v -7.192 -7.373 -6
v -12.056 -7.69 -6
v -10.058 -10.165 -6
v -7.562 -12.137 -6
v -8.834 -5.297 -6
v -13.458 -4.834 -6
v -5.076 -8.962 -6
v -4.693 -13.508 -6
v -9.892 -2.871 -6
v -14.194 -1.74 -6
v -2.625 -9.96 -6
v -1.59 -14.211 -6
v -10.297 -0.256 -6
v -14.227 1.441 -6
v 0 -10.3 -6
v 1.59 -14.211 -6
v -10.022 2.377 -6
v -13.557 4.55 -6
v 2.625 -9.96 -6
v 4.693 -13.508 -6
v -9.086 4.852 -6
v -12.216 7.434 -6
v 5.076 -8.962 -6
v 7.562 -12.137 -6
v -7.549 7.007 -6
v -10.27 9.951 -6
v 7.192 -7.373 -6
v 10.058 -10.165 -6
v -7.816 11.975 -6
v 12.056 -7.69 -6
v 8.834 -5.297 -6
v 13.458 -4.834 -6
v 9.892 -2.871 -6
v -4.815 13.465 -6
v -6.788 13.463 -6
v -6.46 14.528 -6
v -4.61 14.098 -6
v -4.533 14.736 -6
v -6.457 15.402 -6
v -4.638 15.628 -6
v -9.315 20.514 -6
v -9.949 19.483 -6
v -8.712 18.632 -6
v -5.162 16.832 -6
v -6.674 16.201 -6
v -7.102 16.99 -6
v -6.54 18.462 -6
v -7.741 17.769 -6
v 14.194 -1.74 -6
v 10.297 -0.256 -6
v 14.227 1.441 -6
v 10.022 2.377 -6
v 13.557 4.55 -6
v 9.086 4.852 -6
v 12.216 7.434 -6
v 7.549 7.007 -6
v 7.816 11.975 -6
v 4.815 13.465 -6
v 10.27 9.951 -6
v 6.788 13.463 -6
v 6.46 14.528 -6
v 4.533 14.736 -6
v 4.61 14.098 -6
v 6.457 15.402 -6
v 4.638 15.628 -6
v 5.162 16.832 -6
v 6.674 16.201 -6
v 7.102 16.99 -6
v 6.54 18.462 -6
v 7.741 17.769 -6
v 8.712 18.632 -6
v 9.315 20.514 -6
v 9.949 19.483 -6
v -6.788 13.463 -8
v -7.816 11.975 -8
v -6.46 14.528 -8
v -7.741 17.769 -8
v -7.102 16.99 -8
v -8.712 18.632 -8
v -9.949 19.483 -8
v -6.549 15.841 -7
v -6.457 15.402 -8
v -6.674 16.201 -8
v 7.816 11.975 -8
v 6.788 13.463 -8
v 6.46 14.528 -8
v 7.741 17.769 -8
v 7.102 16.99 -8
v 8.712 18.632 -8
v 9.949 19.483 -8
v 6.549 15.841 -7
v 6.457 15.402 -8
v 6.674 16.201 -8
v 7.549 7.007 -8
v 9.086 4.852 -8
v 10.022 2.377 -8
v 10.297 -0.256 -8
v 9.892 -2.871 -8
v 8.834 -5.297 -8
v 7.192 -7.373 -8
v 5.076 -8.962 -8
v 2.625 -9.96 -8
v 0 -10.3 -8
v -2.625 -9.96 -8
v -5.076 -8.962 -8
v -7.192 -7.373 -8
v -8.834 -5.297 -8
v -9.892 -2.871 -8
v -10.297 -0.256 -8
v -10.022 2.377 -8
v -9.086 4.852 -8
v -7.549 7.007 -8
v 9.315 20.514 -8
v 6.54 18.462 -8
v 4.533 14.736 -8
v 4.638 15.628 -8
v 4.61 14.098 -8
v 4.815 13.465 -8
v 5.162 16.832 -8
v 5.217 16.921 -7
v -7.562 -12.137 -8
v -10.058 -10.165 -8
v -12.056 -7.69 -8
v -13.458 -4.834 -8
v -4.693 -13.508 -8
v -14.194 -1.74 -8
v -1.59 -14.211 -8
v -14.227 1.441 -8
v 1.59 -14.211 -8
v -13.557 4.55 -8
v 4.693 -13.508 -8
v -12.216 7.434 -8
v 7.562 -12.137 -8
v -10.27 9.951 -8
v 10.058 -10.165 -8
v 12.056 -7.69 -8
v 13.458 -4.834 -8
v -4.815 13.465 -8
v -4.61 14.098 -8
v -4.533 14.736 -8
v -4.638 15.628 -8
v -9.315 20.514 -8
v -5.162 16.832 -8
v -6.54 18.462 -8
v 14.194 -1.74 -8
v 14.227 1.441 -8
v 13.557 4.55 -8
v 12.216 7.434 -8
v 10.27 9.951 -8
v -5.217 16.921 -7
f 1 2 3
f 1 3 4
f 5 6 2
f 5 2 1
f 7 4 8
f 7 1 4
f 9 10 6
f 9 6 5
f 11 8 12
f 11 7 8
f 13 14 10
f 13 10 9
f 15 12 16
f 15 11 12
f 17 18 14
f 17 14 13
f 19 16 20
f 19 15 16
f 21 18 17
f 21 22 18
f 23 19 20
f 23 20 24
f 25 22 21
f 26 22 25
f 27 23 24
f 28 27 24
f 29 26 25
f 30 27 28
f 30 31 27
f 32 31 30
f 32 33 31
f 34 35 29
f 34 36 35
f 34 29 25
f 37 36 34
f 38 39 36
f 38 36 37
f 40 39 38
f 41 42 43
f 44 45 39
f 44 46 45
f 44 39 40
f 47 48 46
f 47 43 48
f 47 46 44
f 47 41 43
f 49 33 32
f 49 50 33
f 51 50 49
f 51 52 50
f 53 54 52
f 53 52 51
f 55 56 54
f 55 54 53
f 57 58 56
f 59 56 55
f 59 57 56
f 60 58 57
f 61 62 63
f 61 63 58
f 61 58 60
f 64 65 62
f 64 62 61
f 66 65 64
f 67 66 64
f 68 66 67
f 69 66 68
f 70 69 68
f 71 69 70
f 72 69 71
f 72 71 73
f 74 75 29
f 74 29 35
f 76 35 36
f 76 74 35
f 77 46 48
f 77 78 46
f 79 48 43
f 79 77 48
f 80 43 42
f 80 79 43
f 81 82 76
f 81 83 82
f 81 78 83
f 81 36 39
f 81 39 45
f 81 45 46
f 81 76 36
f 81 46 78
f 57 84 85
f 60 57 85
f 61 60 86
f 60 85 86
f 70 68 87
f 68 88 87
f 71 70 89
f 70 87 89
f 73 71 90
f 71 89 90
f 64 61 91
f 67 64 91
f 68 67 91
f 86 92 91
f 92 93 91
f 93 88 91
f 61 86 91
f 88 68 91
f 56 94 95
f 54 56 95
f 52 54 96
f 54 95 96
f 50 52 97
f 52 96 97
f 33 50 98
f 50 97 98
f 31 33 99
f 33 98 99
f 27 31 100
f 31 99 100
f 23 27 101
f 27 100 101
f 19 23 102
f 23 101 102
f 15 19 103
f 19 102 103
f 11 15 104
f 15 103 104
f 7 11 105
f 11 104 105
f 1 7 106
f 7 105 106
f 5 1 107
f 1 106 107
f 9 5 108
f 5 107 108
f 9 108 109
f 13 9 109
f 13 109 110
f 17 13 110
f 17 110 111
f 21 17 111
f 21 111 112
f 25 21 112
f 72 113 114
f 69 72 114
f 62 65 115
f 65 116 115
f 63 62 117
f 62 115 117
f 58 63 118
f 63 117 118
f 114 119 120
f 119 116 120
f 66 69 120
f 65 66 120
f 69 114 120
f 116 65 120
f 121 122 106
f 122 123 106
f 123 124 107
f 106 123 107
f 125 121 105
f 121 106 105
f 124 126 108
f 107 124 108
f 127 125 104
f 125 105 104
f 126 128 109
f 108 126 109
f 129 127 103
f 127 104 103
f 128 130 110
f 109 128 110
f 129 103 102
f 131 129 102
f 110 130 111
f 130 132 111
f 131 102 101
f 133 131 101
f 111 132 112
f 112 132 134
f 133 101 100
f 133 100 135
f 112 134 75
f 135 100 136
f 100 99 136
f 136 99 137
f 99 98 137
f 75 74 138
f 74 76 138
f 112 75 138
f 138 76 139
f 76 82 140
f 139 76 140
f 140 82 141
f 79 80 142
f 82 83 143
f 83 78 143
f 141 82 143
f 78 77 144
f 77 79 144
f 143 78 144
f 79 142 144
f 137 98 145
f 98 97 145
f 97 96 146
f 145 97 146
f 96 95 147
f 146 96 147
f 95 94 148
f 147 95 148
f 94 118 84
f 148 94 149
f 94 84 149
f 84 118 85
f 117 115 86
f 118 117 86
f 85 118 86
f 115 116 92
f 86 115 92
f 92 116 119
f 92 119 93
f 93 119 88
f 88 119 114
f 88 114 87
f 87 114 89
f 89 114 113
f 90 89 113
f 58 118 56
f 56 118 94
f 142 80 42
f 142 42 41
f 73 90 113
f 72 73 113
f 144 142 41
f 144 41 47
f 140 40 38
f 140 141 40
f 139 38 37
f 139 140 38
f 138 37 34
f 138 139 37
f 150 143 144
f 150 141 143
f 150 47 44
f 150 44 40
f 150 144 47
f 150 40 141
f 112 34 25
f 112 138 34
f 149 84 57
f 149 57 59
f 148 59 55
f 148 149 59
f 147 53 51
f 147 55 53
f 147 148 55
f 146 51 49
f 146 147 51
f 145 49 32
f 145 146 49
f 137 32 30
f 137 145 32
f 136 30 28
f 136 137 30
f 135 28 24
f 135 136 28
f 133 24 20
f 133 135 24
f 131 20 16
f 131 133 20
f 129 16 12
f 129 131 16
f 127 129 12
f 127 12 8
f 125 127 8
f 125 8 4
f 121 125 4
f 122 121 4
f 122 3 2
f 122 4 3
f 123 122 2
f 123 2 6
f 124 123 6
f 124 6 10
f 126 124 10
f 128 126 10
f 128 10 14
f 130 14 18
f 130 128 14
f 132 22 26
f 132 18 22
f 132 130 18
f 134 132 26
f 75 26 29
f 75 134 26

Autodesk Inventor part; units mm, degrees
ref_plane "YZ Plane" through (0, 0, 0) normal (1, 0, 0) x (0, 1, 0)
ref_plane "XZ Plane" through (0, 0, 0) normal (0, 1, 0) x (-1, 0, 0)
ref_plane "XY Plane" through (0, 0, 0) normal (0, 0, 1) x (1, 0, 0)
ref_plane "Work Plane1" through (0, 0, -8) normal (0, 0, 1) x (1, 0, 0)
sketch "Sketch1" plane through (0, 0, -8) normal (0, 0, 1) x (1, 0, 0)
  circle A0 centre (0, 0) radius 13.09 projected
  circle A1 centre (0, 0) radius 10 projected
  circle A2 centre (0, 0) radius 13.09 projected
  circle A3 centre (0, 0) radius 10.3
  circle A4 centre (0, 0) radius 14.3
  line L0 (-7.8163, 11.9748) -> (-4.2157, 15.9521) construction
  line L1 (-4.2157, 15.9521) -> (-9.9494, 19.4831) construction
  spline S0 degree 2 poles (-7.8163, 11.9748) (-4.2157, 15.9521) (-9.9494, 19.4831) knots 1 1 1 2 2 2
  line L2 (-9.9494, 19.4831) -> (-9.2931, 20.5487)
  line L3 (-9.3147, 20.5137) -> (-3.3697, 16.8527) construction
  line L4 (-3.3697, 16.8527) -> (-4.8153, 13.4649) construction
  spline S1 degree 2 poles (-9.3147, 20.5137) (-3.3697, 16.8527) (-4.8153, 13.4649) knots 1 1 1 2 2 2
  line L5 (-4.8153, 13.4649) -> (-7.5493, 7.007)
  line L6 (0, 0) -> (0, 1.6434)
  line L7 (7.8163, 11.9748) -> (4.2157, 15.9521) construction
  line L8 (4.2157, 15.9521) -> (9.9494, 19.4831) construction
  spline S2 degree 2 poles (7.8163, 11.9748) (4.2157, 15.9521) (9.9494, 19.4831) knots 1 1 1 2 2 2
  line L9 (9.9494, 19.4831) -> (9.2931, 20.5487)
  line L10 (9.3147, 20.5137) -> (3.3697, 16.8527) construction
  line L11 (3.3697, 16.8527) -> (4.8153, 13.4649) construction
  spline S3 degree 2 poles (9.3147, 20.5137) (3.3697, 16.8527) (4.8153, 13.4649) knots 1 1 1 2 2 2
  line L12 (4.8153, 13.4649) -> (7.5493, 7.007)
  point P0 (0, 0)
  point P1 (4.8153, 13.4649)
  point P2 (7.5493, 7.007)
  point P3 (-4.8153, 13.4649)
  point P4 (7.8163, 11.9748)
  point P5 (4.8153, 13.4649)
  dimension "d0" = 0.3
  dimension "d1" = 4
extrude "Extrusion1" add sketch "Sketch1" along normal blind 2 contours A0 L5 A3 L12 | A0 L12 A4 L5 | S3 L9 S2 A4 | A4 S0 L2 S1 picked at (-7.0541, 9.7176) picked at (13.6381, 2.1556)
properties part number "axle_cap_3DPrint"
